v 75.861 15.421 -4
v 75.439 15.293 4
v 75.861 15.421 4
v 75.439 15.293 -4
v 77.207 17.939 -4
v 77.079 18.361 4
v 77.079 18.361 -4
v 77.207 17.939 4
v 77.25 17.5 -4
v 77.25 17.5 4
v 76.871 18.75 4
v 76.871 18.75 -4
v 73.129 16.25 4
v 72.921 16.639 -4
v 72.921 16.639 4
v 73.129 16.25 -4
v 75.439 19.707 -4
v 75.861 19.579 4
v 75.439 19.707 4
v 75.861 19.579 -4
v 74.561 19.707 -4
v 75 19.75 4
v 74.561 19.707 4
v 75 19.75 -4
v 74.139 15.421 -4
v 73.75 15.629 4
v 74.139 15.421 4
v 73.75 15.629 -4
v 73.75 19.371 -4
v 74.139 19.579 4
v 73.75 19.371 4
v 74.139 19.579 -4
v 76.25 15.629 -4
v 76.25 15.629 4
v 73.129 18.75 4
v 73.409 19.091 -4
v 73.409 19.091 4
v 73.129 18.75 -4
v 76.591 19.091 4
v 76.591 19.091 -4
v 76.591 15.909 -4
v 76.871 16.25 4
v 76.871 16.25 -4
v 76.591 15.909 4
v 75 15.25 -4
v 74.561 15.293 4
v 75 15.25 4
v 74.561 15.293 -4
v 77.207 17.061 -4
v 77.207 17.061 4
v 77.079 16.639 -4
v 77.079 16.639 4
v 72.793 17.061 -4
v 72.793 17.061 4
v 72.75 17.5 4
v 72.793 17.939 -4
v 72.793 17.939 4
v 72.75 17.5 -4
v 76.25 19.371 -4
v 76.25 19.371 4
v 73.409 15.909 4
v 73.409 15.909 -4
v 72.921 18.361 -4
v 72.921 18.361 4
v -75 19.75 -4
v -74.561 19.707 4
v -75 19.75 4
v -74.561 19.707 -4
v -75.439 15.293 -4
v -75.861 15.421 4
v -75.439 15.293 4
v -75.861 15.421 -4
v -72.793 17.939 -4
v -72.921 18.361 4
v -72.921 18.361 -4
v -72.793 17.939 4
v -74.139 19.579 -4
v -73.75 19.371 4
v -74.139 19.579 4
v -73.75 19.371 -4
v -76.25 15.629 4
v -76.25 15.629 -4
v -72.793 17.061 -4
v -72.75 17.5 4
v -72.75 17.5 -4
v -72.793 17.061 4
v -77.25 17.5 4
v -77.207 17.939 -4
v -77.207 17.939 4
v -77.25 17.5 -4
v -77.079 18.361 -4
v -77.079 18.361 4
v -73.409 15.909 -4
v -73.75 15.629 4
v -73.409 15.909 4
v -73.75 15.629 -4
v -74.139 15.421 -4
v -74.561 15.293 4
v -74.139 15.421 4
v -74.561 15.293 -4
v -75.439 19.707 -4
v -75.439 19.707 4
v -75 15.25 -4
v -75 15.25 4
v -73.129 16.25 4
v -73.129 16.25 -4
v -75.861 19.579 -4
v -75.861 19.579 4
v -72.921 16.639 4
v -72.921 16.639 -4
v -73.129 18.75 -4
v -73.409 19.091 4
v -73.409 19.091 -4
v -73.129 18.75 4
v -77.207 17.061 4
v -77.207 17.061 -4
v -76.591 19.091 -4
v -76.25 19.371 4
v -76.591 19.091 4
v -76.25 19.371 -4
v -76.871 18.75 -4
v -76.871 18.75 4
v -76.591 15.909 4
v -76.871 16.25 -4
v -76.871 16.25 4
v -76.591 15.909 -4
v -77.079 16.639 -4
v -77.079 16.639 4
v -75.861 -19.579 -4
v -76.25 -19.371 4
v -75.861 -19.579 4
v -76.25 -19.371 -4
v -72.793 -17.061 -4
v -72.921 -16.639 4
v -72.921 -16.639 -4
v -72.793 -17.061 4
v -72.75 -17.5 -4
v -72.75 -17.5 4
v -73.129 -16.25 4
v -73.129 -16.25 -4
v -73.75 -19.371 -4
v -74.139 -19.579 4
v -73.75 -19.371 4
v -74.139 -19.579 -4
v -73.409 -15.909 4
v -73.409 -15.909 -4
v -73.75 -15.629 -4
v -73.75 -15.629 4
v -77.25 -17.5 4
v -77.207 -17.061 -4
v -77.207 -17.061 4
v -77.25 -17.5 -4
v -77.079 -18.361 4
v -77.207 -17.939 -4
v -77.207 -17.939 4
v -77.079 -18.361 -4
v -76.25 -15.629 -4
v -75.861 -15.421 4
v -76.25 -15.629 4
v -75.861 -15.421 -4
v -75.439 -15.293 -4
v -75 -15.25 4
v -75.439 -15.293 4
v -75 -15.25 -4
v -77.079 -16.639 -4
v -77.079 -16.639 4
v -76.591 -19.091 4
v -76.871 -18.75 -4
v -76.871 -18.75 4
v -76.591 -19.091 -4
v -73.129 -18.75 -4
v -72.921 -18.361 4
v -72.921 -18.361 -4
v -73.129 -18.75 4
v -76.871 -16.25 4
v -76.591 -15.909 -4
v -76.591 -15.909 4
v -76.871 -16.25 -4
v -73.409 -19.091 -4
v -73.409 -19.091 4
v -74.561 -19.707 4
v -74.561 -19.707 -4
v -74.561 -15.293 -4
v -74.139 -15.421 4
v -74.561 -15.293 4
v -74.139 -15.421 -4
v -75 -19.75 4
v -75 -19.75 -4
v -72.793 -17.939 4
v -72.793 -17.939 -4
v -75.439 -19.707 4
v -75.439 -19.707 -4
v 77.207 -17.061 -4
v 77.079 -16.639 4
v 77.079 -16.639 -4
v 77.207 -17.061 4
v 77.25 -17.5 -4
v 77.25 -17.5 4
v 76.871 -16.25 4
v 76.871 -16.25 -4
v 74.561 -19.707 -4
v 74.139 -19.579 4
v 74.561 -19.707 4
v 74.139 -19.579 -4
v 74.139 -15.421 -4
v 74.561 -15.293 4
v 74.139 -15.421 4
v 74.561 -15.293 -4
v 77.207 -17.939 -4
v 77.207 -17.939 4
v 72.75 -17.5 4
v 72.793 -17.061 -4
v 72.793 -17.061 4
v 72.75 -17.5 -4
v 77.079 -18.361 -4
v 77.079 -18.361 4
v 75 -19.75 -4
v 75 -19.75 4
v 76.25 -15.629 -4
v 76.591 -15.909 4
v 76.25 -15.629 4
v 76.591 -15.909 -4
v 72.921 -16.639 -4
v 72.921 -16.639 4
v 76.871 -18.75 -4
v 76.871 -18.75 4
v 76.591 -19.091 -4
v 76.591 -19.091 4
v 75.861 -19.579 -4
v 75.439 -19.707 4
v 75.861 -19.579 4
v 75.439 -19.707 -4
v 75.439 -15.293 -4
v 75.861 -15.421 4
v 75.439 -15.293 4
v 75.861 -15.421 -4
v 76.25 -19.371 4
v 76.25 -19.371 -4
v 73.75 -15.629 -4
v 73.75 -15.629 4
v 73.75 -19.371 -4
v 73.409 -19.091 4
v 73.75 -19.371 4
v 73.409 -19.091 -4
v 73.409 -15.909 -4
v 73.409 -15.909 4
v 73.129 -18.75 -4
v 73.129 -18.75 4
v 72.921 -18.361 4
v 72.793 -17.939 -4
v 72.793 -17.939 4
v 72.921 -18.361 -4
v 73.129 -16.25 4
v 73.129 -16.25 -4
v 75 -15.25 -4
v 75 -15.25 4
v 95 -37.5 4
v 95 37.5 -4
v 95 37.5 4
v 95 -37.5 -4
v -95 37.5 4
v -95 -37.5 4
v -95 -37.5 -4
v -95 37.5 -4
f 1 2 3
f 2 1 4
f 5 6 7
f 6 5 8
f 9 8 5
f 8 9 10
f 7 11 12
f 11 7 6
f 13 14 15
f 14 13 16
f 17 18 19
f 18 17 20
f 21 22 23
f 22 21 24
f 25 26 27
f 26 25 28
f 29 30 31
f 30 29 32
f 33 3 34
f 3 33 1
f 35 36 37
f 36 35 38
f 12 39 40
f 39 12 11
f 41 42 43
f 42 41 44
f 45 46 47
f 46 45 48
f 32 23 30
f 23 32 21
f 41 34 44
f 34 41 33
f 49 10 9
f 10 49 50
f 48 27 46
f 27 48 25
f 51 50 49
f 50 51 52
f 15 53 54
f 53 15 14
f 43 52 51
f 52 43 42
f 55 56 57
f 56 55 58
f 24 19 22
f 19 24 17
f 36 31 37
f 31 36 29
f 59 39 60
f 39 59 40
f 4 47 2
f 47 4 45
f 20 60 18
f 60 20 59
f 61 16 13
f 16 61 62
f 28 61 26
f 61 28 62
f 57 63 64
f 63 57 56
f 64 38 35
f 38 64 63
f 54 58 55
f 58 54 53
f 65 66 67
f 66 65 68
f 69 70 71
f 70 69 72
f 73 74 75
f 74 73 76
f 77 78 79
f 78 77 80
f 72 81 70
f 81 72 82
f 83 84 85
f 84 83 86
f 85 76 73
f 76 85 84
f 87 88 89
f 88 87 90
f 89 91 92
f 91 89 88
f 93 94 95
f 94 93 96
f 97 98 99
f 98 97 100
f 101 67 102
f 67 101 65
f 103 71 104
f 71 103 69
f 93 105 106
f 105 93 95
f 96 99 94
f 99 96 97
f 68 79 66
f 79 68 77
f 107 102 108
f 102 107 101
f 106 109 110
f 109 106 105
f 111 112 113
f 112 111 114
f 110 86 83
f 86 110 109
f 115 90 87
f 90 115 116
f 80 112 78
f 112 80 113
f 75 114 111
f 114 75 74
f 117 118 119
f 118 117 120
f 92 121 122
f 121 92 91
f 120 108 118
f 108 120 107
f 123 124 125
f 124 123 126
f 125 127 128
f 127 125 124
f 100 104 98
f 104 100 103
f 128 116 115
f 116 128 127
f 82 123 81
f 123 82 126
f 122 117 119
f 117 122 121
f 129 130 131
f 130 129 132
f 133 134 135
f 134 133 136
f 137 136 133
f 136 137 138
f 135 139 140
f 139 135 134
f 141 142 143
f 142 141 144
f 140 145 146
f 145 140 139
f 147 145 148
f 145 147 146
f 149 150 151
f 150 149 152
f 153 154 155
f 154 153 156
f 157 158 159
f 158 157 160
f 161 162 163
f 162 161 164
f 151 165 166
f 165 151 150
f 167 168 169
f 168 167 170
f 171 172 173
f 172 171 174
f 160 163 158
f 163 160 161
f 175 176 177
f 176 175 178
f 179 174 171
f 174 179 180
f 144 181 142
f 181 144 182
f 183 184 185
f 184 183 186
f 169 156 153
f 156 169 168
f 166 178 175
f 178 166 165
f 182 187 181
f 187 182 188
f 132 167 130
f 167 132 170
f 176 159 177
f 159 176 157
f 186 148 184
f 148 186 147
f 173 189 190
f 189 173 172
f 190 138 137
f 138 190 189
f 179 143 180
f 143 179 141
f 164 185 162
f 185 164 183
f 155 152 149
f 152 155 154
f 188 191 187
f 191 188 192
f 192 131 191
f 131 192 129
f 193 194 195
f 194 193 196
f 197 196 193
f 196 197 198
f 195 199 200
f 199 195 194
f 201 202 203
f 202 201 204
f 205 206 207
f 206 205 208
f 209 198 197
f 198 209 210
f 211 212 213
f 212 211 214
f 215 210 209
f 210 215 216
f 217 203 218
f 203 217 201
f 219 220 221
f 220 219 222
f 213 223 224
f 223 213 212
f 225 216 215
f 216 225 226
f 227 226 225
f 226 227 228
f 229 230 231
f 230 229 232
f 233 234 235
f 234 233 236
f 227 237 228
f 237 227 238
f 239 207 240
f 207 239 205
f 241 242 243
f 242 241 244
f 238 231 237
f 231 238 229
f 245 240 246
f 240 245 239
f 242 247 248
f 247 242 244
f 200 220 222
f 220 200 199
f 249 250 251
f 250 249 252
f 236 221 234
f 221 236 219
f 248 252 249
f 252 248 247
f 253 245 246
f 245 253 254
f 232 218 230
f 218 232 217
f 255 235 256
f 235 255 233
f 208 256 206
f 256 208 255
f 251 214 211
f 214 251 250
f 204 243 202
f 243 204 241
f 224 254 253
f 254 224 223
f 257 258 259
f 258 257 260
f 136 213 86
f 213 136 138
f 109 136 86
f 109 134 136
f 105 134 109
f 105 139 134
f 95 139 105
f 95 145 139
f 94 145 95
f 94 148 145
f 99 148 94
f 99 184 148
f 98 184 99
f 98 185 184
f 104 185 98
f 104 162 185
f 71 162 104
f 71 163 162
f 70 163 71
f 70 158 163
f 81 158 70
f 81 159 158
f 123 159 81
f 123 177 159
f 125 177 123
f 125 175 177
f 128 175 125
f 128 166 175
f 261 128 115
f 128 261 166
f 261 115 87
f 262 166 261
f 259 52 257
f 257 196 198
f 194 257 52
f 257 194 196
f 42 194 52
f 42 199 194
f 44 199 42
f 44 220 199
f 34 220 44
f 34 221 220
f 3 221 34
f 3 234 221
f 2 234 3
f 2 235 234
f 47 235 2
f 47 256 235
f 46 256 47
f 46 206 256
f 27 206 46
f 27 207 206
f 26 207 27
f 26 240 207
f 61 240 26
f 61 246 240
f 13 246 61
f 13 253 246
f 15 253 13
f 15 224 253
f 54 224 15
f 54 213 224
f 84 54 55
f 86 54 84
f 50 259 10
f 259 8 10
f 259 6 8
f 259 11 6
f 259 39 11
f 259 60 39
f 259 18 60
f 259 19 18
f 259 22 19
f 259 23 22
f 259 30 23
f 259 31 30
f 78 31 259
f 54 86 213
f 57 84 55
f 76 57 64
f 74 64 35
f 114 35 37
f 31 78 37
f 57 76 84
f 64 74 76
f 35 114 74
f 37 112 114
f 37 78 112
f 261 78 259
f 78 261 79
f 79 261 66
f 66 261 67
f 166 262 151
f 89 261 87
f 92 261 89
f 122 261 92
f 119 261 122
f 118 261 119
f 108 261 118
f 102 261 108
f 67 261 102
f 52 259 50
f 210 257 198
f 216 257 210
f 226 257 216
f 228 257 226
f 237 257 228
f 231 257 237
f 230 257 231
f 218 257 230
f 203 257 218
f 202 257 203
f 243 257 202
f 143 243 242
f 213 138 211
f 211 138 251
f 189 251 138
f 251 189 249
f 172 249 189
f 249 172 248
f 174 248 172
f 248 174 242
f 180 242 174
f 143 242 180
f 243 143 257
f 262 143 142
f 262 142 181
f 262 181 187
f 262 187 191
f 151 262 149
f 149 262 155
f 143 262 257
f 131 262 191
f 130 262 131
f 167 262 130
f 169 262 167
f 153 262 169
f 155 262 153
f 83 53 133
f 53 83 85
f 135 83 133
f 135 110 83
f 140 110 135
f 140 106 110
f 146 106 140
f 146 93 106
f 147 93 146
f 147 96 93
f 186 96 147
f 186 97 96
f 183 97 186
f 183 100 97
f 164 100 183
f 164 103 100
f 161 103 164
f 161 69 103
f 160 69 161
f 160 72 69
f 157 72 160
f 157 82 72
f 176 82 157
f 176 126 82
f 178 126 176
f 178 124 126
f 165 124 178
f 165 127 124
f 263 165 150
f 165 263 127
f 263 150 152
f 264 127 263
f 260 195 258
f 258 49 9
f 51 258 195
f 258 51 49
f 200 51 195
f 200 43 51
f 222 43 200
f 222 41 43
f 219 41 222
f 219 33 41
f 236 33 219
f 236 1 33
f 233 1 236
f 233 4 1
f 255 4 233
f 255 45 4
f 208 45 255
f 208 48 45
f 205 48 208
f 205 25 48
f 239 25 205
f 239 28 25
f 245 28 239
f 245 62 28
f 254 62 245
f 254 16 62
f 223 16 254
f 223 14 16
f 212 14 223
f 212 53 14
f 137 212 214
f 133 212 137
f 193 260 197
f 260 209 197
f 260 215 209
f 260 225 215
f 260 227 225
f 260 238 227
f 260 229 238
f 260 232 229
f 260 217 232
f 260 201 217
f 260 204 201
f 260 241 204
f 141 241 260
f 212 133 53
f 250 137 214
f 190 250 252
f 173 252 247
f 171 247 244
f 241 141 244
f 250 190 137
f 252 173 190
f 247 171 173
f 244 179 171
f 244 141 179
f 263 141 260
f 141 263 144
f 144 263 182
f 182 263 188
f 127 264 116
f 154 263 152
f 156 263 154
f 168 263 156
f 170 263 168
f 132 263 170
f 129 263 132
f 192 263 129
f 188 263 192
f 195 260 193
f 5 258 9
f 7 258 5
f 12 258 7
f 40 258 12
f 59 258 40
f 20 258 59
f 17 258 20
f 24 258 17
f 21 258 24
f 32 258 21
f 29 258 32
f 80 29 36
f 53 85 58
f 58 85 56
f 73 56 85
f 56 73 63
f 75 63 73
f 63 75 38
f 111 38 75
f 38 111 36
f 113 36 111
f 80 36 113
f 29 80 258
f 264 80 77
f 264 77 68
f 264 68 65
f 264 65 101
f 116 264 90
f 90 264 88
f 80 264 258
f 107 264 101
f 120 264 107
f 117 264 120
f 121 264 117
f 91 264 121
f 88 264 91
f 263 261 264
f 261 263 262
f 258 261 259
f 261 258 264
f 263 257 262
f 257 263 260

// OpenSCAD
$fn = 32;

// ----------------------------------------------------------------------
// Corner plate 190 x 75 x 8
// 4 holes, centres taken from the edge offset
// ----------------------------------------------------------------------

// --- parameters (mm) ---
plate = [190, 75, 8];  // overall size (x, y, z)
holes = 4;             // number of holes the drawing asks for
hole_d = 4.5;          // hole diameter
edge = 20;             // hole centre offset from the plate edge

// --- derived feature positions (mm) ---
corner_x = plate[0] / 2 - edge;  // = 75   corner hole X
corner_y = plate[1] / 2 - edge;  // = 17.5   corner hole Y
feature_centers = [
  [corner_x, corner_y],
  [-corner_x, corner_y],
  [-corner_x, -corner_y],
  [corner_x, -corner_y]
];   // hole centres the loop below drills

// plate outline, every hole drilled through with the same cutters
difference() {
  cube(plate, center = true);
  for (centre = feature_centers)
    translate([centre[0], centre[1], 0])
      cylinder(d = hole_d, h = plate[2] + 2, center = true);
}
